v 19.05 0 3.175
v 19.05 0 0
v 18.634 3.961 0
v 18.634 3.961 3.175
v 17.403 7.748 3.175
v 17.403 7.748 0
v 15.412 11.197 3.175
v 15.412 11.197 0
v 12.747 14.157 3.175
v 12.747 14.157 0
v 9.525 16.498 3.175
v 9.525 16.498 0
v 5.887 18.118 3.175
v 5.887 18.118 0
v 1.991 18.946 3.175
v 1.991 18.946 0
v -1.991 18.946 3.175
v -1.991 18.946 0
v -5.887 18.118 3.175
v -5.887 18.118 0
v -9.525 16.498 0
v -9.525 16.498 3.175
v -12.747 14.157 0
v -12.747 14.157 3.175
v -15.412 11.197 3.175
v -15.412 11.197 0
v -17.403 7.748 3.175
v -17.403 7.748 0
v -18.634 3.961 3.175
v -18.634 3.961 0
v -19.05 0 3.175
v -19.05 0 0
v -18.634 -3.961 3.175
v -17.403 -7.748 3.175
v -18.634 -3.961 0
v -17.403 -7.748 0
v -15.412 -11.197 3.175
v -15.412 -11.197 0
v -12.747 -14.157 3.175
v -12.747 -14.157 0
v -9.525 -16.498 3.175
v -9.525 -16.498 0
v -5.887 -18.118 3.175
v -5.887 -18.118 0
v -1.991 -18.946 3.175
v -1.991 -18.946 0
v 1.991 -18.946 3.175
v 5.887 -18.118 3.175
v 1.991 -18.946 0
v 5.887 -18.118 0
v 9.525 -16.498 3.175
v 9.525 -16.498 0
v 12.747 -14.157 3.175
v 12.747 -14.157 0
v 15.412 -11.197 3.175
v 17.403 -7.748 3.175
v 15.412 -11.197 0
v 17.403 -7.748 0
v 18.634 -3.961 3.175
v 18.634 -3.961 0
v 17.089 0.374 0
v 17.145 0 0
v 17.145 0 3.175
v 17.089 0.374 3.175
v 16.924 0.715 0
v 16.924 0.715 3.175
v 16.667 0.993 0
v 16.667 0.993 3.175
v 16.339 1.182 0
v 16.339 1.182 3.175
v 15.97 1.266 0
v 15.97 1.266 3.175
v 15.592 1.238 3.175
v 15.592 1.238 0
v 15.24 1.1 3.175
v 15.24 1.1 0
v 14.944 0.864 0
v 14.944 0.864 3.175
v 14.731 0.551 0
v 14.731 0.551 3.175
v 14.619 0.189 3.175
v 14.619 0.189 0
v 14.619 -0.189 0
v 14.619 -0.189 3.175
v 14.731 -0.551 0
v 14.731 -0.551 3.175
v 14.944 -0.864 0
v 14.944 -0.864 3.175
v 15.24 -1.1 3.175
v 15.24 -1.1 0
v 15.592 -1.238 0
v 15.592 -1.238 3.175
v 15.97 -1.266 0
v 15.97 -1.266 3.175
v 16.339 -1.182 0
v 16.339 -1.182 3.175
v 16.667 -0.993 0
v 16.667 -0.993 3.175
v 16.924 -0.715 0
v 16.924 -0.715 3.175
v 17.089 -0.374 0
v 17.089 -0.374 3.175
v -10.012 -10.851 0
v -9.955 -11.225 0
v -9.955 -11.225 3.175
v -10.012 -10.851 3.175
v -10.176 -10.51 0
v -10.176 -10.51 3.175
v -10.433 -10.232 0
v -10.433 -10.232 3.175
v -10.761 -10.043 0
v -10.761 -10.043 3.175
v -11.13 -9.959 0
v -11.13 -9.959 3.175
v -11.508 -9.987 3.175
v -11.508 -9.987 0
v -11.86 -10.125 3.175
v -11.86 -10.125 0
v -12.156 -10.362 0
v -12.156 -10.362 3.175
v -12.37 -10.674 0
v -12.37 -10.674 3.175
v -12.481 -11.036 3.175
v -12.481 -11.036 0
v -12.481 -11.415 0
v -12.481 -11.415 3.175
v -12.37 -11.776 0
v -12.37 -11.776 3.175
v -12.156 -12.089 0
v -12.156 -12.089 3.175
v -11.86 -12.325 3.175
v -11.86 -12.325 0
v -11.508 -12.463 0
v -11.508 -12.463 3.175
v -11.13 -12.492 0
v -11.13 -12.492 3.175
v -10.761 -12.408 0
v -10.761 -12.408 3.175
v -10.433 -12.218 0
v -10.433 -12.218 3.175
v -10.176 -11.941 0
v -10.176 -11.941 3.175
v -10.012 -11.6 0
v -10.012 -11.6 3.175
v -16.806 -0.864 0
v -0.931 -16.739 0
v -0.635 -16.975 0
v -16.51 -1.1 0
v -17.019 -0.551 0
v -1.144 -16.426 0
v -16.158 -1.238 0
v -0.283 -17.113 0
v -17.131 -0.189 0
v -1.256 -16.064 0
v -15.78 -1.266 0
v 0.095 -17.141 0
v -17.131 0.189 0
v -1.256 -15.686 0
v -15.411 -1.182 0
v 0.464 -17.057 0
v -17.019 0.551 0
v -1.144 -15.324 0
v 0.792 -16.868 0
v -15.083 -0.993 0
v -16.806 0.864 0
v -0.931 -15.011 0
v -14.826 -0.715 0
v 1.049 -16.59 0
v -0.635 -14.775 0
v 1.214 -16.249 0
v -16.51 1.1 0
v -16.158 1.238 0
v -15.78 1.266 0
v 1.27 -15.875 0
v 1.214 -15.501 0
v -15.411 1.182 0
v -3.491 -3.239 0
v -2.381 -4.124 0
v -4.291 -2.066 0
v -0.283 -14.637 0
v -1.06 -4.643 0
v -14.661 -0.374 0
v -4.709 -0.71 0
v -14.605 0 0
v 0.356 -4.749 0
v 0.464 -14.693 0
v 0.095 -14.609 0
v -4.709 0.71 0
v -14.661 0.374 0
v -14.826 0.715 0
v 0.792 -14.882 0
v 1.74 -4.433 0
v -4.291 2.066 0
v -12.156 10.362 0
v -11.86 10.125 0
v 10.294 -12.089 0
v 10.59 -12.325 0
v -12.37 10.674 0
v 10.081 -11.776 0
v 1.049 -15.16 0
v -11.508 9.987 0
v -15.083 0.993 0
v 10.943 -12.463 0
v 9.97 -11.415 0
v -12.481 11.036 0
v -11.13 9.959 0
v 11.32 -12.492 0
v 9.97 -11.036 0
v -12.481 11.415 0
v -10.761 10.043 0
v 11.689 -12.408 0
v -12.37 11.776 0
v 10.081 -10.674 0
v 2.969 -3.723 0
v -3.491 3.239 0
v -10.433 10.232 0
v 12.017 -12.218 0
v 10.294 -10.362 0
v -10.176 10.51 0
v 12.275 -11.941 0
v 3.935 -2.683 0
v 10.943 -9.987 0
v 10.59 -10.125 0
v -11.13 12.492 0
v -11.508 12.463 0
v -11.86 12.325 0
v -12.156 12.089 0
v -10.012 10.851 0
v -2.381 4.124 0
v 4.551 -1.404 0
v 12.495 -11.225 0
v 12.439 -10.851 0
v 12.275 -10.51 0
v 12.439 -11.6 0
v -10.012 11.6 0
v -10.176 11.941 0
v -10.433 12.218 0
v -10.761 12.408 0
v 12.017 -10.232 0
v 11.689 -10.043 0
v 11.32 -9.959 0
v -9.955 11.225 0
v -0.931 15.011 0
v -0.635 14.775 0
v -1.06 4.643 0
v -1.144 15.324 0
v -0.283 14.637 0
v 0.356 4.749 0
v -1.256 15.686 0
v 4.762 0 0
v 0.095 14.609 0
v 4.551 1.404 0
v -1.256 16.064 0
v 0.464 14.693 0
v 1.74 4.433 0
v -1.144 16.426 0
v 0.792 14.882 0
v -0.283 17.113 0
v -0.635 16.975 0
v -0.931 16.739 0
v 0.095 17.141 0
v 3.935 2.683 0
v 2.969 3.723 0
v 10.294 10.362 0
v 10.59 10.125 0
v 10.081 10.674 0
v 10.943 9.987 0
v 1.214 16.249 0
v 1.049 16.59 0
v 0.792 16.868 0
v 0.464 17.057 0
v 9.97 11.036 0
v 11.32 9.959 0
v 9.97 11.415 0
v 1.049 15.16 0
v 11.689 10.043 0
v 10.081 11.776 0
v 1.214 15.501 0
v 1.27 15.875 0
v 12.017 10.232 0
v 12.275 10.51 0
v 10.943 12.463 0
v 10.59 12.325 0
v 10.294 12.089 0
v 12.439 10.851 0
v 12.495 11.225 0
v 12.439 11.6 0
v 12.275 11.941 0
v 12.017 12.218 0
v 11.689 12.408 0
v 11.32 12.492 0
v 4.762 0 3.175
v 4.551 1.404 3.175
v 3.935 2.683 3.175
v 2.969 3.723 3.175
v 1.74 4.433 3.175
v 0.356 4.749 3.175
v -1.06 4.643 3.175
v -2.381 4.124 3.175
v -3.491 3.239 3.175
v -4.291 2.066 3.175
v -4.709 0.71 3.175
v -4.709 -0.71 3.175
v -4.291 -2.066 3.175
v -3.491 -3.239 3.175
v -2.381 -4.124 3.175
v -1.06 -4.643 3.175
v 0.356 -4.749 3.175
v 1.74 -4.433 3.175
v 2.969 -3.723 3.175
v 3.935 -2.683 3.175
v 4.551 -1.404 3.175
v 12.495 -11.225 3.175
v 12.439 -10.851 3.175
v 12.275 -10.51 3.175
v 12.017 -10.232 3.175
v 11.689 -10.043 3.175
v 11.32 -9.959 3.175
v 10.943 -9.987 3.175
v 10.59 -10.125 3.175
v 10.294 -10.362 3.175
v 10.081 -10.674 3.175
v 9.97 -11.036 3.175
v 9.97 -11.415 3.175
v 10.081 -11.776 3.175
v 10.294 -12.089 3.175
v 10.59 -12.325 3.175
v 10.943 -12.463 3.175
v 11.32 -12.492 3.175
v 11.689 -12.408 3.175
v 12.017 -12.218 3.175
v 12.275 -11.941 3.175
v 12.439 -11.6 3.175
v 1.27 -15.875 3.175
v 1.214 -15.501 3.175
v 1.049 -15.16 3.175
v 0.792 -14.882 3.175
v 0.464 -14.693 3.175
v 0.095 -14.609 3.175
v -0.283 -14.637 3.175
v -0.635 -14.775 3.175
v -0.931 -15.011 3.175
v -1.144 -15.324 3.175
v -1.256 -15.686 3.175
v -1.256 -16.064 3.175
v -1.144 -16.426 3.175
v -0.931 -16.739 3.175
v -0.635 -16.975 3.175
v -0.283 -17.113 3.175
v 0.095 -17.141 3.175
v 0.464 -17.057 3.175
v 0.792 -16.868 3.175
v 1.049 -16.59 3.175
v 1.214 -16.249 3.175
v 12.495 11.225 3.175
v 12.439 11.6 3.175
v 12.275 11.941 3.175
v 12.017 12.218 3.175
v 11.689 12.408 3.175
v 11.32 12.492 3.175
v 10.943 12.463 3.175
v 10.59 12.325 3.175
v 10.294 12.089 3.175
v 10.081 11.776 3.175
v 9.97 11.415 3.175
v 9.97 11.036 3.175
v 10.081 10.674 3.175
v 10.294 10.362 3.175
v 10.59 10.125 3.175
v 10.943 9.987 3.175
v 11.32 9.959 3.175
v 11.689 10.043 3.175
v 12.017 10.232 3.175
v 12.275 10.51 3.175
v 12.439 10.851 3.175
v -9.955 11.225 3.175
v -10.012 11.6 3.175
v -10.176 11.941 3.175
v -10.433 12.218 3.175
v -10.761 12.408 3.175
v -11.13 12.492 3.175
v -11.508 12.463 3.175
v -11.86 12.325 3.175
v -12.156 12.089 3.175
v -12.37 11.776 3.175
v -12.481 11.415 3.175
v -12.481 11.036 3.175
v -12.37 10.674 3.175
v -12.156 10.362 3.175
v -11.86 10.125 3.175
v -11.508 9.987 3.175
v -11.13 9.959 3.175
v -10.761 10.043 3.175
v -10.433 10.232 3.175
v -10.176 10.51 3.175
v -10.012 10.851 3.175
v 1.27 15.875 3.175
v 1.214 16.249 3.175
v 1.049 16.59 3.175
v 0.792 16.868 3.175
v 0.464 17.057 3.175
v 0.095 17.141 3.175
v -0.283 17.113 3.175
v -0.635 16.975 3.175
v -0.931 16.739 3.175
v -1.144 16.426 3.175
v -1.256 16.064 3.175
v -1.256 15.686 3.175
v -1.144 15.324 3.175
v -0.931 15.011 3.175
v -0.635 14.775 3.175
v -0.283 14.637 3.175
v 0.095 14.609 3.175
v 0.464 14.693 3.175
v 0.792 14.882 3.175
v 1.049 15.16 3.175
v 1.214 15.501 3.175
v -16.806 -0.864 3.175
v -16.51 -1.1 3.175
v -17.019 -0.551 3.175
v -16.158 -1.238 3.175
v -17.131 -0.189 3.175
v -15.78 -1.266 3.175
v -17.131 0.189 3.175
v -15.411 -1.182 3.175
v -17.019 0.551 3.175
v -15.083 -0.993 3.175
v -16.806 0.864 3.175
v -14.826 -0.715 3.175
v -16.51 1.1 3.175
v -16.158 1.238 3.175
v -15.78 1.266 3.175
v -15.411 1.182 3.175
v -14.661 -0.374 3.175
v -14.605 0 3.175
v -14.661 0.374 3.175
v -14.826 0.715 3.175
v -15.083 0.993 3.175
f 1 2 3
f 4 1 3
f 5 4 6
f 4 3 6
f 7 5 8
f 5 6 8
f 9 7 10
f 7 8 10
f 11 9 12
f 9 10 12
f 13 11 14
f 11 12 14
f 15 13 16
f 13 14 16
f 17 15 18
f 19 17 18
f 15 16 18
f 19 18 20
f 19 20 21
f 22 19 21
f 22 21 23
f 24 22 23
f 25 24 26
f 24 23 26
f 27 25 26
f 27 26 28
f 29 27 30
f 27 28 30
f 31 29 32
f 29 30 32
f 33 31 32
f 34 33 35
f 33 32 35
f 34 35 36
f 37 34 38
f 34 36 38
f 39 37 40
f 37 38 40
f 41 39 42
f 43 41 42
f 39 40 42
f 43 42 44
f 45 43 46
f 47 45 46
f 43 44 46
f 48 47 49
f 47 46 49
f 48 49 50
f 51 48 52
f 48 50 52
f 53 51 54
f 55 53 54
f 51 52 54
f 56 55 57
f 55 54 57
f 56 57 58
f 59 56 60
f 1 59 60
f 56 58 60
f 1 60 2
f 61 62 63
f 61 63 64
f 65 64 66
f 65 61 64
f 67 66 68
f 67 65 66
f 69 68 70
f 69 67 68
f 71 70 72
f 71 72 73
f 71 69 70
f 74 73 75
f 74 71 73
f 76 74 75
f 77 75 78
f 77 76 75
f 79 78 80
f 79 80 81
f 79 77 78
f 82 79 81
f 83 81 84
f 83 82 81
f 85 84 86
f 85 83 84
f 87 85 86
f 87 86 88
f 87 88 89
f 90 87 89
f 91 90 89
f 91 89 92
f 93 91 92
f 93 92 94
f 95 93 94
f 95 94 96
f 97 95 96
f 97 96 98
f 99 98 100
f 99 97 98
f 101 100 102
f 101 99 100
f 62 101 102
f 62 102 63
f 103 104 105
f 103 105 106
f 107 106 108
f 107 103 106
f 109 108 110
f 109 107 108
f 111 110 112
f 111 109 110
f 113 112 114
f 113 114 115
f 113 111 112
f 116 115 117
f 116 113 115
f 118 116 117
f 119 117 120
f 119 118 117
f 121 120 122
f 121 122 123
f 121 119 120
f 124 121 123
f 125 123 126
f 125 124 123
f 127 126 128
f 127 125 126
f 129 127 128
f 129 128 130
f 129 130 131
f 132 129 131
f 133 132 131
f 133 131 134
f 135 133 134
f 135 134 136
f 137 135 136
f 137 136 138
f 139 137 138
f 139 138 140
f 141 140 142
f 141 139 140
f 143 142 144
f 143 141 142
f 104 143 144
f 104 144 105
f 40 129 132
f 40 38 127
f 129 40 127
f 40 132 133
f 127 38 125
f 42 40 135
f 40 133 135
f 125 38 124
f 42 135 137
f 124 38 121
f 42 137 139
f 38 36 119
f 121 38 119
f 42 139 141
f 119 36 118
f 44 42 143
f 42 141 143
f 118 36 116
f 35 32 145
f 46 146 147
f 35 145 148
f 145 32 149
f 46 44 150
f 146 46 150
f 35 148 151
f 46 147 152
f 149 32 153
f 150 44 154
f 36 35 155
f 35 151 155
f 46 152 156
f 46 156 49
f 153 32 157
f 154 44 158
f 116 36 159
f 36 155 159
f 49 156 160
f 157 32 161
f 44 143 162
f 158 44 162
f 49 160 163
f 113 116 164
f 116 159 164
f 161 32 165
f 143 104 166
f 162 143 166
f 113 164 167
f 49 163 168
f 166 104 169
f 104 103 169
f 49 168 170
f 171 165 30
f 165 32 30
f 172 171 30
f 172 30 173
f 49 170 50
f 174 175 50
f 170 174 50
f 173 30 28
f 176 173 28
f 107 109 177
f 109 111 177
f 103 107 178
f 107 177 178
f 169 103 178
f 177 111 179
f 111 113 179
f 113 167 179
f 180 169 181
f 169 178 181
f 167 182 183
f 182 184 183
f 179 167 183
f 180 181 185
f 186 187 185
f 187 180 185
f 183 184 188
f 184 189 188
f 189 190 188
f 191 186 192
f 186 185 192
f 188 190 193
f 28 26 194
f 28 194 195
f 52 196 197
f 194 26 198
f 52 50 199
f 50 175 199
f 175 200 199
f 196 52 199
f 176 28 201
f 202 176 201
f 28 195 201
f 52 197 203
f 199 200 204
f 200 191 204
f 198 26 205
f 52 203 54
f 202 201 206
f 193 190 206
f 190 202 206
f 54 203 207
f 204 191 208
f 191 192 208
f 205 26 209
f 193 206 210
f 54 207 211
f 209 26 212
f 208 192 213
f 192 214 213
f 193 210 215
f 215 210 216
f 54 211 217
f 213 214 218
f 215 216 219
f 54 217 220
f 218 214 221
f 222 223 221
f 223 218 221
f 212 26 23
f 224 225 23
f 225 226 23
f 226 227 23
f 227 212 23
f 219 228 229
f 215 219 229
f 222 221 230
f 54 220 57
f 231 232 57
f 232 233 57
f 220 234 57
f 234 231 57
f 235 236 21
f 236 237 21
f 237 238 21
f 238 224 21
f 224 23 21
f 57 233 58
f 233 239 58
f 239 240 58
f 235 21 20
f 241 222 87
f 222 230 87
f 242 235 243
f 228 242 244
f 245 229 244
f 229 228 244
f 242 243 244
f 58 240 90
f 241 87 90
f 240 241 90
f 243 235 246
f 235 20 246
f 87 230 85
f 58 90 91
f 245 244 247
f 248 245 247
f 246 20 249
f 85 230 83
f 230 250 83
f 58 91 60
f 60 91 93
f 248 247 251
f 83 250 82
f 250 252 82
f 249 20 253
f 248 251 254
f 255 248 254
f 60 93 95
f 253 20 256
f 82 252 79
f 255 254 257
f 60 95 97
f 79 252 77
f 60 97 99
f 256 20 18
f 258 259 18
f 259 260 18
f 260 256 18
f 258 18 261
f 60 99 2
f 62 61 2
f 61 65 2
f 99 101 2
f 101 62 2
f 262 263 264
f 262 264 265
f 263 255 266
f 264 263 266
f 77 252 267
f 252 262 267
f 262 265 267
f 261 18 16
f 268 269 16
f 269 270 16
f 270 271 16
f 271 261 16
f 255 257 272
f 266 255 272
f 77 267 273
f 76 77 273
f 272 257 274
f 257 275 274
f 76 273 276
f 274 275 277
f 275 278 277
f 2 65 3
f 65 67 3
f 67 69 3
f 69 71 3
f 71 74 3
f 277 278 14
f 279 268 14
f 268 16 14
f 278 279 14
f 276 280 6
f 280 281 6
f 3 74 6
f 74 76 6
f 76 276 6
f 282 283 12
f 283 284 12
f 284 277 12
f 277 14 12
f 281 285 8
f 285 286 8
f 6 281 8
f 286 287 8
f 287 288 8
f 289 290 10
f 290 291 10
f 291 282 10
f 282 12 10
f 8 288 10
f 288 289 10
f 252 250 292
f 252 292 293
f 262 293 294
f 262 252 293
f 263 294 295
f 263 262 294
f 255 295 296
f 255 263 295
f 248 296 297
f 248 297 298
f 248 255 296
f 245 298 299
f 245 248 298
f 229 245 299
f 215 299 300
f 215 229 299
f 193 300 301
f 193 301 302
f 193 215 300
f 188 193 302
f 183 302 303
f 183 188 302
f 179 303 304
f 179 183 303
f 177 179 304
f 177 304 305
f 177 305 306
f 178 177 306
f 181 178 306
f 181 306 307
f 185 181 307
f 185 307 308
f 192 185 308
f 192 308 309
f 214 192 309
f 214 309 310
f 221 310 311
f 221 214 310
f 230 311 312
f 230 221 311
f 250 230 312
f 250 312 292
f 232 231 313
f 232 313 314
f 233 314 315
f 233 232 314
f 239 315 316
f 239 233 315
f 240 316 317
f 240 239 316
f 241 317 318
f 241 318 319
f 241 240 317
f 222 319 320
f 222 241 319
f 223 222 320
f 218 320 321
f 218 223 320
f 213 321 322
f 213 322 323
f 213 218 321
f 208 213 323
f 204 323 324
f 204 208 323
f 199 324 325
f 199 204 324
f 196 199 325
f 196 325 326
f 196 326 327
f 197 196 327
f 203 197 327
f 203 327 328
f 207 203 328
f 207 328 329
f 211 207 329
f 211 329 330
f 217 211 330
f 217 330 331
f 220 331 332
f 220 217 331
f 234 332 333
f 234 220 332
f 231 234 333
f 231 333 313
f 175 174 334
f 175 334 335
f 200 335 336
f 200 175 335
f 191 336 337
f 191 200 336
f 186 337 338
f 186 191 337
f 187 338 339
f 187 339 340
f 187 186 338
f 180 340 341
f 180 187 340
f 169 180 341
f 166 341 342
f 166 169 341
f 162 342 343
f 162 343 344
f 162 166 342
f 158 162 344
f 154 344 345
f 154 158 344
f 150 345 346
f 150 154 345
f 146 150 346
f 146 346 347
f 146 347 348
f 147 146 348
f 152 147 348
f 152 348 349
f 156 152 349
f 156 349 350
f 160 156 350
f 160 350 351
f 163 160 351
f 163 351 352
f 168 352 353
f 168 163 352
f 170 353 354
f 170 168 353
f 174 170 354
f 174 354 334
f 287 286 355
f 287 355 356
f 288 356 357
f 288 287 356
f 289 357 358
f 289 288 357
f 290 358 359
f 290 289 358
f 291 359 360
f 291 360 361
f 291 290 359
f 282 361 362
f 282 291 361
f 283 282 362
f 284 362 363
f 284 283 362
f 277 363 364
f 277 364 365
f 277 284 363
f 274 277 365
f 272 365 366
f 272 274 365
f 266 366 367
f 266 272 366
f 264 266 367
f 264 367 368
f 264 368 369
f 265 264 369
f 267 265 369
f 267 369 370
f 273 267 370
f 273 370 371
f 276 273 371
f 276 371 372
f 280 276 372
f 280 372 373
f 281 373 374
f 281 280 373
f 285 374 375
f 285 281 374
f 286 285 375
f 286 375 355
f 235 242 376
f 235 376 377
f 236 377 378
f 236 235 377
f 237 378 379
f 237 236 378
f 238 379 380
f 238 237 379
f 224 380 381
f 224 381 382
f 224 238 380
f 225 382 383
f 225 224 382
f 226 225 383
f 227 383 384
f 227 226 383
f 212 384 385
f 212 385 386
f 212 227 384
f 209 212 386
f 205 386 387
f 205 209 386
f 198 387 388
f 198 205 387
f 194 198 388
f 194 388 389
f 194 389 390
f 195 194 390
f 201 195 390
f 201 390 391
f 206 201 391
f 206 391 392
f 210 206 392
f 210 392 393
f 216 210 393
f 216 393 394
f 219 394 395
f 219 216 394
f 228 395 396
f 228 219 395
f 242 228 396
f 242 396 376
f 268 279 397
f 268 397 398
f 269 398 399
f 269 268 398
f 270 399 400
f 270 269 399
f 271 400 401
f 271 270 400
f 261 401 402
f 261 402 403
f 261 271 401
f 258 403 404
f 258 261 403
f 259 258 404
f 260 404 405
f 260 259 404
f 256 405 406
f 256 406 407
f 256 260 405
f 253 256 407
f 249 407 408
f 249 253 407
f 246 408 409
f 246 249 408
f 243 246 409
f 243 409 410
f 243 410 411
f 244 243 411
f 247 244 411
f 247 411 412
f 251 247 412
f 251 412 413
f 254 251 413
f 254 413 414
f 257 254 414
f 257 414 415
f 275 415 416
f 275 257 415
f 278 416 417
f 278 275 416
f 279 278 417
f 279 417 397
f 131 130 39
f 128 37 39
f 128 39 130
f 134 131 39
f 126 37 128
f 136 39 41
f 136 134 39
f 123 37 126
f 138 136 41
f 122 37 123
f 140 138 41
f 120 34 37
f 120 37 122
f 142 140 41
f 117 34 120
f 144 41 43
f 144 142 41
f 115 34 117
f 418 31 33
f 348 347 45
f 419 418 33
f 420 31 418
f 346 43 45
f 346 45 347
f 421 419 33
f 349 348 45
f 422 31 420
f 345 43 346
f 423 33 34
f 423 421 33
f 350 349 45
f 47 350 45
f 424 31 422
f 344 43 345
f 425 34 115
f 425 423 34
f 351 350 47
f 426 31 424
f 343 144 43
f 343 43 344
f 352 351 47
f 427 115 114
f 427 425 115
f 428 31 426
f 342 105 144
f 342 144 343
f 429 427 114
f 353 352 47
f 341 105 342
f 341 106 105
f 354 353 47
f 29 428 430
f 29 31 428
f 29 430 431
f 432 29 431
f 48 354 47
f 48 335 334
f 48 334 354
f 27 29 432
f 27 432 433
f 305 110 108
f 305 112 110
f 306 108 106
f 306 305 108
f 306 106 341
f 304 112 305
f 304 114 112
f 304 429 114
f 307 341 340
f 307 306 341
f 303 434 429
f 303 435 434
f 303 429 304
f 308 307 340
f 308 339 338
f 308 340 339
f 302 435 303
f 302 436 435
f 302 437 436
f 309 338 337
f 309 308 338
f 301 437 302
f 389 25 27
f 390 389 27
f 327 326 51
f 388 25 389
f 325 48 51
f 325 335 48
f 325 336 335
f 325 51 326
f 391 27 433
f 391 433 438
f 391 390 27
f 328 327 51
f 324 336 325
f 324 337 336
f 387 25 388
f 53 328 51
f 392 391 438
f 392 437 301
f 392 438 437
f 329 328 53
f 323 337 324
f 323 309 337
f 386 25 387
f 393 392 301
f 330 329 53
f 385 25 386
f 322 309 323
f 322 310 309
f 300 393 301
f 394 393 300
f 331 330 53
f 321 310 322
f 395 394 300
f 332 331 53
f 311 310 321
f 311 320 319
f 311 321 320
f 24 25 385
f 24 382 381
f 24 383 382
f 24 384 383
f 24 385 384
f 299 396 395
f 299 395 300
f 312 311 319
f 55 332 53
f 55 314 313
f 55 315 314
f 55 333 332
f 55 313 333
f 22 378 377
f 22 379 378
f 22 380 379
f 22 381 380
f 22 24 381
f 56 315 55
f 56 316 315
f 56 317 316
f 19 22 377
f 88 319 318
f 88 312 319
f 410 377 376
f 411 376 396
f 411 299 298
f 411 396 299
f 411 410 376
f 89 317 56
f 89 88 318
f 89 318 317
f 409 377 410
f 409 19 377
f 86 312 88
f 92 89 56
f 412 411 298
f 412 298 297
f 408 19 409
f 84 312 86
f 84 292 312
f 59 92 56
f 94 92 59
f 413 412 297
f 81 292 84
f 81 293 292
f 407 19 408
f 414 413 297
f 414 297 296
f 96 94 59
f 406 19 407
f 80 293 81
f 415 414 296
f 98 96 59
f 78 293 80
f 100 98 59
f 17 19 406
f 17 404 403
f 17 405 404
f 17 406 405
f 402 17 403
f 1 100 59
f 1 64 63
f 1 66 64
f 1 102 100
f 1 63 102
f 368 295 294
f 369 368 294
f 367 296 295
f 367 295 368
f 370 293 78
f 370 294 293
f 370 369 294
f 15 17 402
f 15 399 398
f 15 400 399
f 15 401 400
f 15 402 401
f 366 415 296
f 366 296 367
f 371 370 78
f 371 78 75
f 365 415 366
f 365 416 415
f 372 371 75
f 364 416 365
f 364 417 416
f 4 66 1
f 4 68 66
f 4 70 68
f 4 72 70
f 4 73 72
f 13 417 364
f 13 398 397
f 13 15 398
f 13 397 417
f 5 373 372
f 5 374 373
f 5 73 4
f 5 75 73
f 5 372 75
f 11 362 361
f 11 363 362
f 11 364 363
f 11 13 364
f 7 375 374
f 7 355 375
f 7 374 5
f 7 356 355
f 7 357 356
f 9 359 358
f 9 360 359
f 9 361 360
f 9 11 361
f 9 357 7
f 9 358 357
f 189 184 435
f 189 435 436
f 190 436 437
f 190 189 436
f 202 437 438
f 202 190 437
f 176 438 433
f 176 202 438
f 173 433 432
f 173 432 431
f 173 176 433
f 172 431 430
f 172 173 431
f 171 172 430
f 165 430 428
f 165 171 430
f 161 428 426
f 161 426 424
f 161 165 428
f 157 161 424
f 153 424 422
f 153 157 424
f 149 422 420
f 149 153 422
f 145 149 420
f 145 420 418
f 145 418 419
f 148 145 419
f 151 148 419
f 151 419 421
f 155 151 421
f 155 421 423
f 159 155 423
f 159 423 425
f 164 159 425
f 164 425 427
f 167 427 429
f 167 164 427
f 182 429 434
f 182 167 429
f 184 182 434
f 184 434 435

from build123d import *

# Parameters (mm, degrees)
SKETCH1_R           = 19.05
SKETCH1_R_2         = 1.27
SKETCH1_R_3         = 4.7625
BOSS_EXTRUDE1_DEPTH = 3.175


with BuildPart() as part:
    # Sketch1 → Boss-Extrude1 (new body)
    with BuildSketch(Plane.XY):
        Circle(SKETCH1_R)
        with Locations((0, 15.875)):
            Circle(SKETCH1_R_2, mode=Mode.SUBTRACT)
        with Locations((11.225320151, 11.225320151)):
            Circle(SKETCH1_R_2, mode=Mode.SUBTRACT)
        with Locations((15.875, 0)):
            Circle(SKETCH1_R_2, mode=Mode.SUBTRACT)
        Circle(SKETCH1_R_3, mode=Mode.SUBTRACT)
        with Locations((11.225320151, -11.225320151)):
            Circle(SKETCH1_R_2, mode=Mode.SUBTRACT)
        with Locations((0, -15.875)):
            Circle(SKETCH1_R_2, mode=Mode.SUBTRACT)
        with Locations((-11.225320151, -11.225320151)):
            Circle(SKETCH1_R_2, mode=Mode.SUBTRACT)
        with Locations((-15.875, 0)):
            Circle(SKETCH1_R_2, mode=Mode.SUBTRACT)
        with Locations((-11.225320151, 11.225320151)):
            Circle(SKETCH1_R_2, mode=Mode.SUBTRACT)
    extrude(amount=BOSS_EXTRUDE1_DEPTH)


solid = part.part
